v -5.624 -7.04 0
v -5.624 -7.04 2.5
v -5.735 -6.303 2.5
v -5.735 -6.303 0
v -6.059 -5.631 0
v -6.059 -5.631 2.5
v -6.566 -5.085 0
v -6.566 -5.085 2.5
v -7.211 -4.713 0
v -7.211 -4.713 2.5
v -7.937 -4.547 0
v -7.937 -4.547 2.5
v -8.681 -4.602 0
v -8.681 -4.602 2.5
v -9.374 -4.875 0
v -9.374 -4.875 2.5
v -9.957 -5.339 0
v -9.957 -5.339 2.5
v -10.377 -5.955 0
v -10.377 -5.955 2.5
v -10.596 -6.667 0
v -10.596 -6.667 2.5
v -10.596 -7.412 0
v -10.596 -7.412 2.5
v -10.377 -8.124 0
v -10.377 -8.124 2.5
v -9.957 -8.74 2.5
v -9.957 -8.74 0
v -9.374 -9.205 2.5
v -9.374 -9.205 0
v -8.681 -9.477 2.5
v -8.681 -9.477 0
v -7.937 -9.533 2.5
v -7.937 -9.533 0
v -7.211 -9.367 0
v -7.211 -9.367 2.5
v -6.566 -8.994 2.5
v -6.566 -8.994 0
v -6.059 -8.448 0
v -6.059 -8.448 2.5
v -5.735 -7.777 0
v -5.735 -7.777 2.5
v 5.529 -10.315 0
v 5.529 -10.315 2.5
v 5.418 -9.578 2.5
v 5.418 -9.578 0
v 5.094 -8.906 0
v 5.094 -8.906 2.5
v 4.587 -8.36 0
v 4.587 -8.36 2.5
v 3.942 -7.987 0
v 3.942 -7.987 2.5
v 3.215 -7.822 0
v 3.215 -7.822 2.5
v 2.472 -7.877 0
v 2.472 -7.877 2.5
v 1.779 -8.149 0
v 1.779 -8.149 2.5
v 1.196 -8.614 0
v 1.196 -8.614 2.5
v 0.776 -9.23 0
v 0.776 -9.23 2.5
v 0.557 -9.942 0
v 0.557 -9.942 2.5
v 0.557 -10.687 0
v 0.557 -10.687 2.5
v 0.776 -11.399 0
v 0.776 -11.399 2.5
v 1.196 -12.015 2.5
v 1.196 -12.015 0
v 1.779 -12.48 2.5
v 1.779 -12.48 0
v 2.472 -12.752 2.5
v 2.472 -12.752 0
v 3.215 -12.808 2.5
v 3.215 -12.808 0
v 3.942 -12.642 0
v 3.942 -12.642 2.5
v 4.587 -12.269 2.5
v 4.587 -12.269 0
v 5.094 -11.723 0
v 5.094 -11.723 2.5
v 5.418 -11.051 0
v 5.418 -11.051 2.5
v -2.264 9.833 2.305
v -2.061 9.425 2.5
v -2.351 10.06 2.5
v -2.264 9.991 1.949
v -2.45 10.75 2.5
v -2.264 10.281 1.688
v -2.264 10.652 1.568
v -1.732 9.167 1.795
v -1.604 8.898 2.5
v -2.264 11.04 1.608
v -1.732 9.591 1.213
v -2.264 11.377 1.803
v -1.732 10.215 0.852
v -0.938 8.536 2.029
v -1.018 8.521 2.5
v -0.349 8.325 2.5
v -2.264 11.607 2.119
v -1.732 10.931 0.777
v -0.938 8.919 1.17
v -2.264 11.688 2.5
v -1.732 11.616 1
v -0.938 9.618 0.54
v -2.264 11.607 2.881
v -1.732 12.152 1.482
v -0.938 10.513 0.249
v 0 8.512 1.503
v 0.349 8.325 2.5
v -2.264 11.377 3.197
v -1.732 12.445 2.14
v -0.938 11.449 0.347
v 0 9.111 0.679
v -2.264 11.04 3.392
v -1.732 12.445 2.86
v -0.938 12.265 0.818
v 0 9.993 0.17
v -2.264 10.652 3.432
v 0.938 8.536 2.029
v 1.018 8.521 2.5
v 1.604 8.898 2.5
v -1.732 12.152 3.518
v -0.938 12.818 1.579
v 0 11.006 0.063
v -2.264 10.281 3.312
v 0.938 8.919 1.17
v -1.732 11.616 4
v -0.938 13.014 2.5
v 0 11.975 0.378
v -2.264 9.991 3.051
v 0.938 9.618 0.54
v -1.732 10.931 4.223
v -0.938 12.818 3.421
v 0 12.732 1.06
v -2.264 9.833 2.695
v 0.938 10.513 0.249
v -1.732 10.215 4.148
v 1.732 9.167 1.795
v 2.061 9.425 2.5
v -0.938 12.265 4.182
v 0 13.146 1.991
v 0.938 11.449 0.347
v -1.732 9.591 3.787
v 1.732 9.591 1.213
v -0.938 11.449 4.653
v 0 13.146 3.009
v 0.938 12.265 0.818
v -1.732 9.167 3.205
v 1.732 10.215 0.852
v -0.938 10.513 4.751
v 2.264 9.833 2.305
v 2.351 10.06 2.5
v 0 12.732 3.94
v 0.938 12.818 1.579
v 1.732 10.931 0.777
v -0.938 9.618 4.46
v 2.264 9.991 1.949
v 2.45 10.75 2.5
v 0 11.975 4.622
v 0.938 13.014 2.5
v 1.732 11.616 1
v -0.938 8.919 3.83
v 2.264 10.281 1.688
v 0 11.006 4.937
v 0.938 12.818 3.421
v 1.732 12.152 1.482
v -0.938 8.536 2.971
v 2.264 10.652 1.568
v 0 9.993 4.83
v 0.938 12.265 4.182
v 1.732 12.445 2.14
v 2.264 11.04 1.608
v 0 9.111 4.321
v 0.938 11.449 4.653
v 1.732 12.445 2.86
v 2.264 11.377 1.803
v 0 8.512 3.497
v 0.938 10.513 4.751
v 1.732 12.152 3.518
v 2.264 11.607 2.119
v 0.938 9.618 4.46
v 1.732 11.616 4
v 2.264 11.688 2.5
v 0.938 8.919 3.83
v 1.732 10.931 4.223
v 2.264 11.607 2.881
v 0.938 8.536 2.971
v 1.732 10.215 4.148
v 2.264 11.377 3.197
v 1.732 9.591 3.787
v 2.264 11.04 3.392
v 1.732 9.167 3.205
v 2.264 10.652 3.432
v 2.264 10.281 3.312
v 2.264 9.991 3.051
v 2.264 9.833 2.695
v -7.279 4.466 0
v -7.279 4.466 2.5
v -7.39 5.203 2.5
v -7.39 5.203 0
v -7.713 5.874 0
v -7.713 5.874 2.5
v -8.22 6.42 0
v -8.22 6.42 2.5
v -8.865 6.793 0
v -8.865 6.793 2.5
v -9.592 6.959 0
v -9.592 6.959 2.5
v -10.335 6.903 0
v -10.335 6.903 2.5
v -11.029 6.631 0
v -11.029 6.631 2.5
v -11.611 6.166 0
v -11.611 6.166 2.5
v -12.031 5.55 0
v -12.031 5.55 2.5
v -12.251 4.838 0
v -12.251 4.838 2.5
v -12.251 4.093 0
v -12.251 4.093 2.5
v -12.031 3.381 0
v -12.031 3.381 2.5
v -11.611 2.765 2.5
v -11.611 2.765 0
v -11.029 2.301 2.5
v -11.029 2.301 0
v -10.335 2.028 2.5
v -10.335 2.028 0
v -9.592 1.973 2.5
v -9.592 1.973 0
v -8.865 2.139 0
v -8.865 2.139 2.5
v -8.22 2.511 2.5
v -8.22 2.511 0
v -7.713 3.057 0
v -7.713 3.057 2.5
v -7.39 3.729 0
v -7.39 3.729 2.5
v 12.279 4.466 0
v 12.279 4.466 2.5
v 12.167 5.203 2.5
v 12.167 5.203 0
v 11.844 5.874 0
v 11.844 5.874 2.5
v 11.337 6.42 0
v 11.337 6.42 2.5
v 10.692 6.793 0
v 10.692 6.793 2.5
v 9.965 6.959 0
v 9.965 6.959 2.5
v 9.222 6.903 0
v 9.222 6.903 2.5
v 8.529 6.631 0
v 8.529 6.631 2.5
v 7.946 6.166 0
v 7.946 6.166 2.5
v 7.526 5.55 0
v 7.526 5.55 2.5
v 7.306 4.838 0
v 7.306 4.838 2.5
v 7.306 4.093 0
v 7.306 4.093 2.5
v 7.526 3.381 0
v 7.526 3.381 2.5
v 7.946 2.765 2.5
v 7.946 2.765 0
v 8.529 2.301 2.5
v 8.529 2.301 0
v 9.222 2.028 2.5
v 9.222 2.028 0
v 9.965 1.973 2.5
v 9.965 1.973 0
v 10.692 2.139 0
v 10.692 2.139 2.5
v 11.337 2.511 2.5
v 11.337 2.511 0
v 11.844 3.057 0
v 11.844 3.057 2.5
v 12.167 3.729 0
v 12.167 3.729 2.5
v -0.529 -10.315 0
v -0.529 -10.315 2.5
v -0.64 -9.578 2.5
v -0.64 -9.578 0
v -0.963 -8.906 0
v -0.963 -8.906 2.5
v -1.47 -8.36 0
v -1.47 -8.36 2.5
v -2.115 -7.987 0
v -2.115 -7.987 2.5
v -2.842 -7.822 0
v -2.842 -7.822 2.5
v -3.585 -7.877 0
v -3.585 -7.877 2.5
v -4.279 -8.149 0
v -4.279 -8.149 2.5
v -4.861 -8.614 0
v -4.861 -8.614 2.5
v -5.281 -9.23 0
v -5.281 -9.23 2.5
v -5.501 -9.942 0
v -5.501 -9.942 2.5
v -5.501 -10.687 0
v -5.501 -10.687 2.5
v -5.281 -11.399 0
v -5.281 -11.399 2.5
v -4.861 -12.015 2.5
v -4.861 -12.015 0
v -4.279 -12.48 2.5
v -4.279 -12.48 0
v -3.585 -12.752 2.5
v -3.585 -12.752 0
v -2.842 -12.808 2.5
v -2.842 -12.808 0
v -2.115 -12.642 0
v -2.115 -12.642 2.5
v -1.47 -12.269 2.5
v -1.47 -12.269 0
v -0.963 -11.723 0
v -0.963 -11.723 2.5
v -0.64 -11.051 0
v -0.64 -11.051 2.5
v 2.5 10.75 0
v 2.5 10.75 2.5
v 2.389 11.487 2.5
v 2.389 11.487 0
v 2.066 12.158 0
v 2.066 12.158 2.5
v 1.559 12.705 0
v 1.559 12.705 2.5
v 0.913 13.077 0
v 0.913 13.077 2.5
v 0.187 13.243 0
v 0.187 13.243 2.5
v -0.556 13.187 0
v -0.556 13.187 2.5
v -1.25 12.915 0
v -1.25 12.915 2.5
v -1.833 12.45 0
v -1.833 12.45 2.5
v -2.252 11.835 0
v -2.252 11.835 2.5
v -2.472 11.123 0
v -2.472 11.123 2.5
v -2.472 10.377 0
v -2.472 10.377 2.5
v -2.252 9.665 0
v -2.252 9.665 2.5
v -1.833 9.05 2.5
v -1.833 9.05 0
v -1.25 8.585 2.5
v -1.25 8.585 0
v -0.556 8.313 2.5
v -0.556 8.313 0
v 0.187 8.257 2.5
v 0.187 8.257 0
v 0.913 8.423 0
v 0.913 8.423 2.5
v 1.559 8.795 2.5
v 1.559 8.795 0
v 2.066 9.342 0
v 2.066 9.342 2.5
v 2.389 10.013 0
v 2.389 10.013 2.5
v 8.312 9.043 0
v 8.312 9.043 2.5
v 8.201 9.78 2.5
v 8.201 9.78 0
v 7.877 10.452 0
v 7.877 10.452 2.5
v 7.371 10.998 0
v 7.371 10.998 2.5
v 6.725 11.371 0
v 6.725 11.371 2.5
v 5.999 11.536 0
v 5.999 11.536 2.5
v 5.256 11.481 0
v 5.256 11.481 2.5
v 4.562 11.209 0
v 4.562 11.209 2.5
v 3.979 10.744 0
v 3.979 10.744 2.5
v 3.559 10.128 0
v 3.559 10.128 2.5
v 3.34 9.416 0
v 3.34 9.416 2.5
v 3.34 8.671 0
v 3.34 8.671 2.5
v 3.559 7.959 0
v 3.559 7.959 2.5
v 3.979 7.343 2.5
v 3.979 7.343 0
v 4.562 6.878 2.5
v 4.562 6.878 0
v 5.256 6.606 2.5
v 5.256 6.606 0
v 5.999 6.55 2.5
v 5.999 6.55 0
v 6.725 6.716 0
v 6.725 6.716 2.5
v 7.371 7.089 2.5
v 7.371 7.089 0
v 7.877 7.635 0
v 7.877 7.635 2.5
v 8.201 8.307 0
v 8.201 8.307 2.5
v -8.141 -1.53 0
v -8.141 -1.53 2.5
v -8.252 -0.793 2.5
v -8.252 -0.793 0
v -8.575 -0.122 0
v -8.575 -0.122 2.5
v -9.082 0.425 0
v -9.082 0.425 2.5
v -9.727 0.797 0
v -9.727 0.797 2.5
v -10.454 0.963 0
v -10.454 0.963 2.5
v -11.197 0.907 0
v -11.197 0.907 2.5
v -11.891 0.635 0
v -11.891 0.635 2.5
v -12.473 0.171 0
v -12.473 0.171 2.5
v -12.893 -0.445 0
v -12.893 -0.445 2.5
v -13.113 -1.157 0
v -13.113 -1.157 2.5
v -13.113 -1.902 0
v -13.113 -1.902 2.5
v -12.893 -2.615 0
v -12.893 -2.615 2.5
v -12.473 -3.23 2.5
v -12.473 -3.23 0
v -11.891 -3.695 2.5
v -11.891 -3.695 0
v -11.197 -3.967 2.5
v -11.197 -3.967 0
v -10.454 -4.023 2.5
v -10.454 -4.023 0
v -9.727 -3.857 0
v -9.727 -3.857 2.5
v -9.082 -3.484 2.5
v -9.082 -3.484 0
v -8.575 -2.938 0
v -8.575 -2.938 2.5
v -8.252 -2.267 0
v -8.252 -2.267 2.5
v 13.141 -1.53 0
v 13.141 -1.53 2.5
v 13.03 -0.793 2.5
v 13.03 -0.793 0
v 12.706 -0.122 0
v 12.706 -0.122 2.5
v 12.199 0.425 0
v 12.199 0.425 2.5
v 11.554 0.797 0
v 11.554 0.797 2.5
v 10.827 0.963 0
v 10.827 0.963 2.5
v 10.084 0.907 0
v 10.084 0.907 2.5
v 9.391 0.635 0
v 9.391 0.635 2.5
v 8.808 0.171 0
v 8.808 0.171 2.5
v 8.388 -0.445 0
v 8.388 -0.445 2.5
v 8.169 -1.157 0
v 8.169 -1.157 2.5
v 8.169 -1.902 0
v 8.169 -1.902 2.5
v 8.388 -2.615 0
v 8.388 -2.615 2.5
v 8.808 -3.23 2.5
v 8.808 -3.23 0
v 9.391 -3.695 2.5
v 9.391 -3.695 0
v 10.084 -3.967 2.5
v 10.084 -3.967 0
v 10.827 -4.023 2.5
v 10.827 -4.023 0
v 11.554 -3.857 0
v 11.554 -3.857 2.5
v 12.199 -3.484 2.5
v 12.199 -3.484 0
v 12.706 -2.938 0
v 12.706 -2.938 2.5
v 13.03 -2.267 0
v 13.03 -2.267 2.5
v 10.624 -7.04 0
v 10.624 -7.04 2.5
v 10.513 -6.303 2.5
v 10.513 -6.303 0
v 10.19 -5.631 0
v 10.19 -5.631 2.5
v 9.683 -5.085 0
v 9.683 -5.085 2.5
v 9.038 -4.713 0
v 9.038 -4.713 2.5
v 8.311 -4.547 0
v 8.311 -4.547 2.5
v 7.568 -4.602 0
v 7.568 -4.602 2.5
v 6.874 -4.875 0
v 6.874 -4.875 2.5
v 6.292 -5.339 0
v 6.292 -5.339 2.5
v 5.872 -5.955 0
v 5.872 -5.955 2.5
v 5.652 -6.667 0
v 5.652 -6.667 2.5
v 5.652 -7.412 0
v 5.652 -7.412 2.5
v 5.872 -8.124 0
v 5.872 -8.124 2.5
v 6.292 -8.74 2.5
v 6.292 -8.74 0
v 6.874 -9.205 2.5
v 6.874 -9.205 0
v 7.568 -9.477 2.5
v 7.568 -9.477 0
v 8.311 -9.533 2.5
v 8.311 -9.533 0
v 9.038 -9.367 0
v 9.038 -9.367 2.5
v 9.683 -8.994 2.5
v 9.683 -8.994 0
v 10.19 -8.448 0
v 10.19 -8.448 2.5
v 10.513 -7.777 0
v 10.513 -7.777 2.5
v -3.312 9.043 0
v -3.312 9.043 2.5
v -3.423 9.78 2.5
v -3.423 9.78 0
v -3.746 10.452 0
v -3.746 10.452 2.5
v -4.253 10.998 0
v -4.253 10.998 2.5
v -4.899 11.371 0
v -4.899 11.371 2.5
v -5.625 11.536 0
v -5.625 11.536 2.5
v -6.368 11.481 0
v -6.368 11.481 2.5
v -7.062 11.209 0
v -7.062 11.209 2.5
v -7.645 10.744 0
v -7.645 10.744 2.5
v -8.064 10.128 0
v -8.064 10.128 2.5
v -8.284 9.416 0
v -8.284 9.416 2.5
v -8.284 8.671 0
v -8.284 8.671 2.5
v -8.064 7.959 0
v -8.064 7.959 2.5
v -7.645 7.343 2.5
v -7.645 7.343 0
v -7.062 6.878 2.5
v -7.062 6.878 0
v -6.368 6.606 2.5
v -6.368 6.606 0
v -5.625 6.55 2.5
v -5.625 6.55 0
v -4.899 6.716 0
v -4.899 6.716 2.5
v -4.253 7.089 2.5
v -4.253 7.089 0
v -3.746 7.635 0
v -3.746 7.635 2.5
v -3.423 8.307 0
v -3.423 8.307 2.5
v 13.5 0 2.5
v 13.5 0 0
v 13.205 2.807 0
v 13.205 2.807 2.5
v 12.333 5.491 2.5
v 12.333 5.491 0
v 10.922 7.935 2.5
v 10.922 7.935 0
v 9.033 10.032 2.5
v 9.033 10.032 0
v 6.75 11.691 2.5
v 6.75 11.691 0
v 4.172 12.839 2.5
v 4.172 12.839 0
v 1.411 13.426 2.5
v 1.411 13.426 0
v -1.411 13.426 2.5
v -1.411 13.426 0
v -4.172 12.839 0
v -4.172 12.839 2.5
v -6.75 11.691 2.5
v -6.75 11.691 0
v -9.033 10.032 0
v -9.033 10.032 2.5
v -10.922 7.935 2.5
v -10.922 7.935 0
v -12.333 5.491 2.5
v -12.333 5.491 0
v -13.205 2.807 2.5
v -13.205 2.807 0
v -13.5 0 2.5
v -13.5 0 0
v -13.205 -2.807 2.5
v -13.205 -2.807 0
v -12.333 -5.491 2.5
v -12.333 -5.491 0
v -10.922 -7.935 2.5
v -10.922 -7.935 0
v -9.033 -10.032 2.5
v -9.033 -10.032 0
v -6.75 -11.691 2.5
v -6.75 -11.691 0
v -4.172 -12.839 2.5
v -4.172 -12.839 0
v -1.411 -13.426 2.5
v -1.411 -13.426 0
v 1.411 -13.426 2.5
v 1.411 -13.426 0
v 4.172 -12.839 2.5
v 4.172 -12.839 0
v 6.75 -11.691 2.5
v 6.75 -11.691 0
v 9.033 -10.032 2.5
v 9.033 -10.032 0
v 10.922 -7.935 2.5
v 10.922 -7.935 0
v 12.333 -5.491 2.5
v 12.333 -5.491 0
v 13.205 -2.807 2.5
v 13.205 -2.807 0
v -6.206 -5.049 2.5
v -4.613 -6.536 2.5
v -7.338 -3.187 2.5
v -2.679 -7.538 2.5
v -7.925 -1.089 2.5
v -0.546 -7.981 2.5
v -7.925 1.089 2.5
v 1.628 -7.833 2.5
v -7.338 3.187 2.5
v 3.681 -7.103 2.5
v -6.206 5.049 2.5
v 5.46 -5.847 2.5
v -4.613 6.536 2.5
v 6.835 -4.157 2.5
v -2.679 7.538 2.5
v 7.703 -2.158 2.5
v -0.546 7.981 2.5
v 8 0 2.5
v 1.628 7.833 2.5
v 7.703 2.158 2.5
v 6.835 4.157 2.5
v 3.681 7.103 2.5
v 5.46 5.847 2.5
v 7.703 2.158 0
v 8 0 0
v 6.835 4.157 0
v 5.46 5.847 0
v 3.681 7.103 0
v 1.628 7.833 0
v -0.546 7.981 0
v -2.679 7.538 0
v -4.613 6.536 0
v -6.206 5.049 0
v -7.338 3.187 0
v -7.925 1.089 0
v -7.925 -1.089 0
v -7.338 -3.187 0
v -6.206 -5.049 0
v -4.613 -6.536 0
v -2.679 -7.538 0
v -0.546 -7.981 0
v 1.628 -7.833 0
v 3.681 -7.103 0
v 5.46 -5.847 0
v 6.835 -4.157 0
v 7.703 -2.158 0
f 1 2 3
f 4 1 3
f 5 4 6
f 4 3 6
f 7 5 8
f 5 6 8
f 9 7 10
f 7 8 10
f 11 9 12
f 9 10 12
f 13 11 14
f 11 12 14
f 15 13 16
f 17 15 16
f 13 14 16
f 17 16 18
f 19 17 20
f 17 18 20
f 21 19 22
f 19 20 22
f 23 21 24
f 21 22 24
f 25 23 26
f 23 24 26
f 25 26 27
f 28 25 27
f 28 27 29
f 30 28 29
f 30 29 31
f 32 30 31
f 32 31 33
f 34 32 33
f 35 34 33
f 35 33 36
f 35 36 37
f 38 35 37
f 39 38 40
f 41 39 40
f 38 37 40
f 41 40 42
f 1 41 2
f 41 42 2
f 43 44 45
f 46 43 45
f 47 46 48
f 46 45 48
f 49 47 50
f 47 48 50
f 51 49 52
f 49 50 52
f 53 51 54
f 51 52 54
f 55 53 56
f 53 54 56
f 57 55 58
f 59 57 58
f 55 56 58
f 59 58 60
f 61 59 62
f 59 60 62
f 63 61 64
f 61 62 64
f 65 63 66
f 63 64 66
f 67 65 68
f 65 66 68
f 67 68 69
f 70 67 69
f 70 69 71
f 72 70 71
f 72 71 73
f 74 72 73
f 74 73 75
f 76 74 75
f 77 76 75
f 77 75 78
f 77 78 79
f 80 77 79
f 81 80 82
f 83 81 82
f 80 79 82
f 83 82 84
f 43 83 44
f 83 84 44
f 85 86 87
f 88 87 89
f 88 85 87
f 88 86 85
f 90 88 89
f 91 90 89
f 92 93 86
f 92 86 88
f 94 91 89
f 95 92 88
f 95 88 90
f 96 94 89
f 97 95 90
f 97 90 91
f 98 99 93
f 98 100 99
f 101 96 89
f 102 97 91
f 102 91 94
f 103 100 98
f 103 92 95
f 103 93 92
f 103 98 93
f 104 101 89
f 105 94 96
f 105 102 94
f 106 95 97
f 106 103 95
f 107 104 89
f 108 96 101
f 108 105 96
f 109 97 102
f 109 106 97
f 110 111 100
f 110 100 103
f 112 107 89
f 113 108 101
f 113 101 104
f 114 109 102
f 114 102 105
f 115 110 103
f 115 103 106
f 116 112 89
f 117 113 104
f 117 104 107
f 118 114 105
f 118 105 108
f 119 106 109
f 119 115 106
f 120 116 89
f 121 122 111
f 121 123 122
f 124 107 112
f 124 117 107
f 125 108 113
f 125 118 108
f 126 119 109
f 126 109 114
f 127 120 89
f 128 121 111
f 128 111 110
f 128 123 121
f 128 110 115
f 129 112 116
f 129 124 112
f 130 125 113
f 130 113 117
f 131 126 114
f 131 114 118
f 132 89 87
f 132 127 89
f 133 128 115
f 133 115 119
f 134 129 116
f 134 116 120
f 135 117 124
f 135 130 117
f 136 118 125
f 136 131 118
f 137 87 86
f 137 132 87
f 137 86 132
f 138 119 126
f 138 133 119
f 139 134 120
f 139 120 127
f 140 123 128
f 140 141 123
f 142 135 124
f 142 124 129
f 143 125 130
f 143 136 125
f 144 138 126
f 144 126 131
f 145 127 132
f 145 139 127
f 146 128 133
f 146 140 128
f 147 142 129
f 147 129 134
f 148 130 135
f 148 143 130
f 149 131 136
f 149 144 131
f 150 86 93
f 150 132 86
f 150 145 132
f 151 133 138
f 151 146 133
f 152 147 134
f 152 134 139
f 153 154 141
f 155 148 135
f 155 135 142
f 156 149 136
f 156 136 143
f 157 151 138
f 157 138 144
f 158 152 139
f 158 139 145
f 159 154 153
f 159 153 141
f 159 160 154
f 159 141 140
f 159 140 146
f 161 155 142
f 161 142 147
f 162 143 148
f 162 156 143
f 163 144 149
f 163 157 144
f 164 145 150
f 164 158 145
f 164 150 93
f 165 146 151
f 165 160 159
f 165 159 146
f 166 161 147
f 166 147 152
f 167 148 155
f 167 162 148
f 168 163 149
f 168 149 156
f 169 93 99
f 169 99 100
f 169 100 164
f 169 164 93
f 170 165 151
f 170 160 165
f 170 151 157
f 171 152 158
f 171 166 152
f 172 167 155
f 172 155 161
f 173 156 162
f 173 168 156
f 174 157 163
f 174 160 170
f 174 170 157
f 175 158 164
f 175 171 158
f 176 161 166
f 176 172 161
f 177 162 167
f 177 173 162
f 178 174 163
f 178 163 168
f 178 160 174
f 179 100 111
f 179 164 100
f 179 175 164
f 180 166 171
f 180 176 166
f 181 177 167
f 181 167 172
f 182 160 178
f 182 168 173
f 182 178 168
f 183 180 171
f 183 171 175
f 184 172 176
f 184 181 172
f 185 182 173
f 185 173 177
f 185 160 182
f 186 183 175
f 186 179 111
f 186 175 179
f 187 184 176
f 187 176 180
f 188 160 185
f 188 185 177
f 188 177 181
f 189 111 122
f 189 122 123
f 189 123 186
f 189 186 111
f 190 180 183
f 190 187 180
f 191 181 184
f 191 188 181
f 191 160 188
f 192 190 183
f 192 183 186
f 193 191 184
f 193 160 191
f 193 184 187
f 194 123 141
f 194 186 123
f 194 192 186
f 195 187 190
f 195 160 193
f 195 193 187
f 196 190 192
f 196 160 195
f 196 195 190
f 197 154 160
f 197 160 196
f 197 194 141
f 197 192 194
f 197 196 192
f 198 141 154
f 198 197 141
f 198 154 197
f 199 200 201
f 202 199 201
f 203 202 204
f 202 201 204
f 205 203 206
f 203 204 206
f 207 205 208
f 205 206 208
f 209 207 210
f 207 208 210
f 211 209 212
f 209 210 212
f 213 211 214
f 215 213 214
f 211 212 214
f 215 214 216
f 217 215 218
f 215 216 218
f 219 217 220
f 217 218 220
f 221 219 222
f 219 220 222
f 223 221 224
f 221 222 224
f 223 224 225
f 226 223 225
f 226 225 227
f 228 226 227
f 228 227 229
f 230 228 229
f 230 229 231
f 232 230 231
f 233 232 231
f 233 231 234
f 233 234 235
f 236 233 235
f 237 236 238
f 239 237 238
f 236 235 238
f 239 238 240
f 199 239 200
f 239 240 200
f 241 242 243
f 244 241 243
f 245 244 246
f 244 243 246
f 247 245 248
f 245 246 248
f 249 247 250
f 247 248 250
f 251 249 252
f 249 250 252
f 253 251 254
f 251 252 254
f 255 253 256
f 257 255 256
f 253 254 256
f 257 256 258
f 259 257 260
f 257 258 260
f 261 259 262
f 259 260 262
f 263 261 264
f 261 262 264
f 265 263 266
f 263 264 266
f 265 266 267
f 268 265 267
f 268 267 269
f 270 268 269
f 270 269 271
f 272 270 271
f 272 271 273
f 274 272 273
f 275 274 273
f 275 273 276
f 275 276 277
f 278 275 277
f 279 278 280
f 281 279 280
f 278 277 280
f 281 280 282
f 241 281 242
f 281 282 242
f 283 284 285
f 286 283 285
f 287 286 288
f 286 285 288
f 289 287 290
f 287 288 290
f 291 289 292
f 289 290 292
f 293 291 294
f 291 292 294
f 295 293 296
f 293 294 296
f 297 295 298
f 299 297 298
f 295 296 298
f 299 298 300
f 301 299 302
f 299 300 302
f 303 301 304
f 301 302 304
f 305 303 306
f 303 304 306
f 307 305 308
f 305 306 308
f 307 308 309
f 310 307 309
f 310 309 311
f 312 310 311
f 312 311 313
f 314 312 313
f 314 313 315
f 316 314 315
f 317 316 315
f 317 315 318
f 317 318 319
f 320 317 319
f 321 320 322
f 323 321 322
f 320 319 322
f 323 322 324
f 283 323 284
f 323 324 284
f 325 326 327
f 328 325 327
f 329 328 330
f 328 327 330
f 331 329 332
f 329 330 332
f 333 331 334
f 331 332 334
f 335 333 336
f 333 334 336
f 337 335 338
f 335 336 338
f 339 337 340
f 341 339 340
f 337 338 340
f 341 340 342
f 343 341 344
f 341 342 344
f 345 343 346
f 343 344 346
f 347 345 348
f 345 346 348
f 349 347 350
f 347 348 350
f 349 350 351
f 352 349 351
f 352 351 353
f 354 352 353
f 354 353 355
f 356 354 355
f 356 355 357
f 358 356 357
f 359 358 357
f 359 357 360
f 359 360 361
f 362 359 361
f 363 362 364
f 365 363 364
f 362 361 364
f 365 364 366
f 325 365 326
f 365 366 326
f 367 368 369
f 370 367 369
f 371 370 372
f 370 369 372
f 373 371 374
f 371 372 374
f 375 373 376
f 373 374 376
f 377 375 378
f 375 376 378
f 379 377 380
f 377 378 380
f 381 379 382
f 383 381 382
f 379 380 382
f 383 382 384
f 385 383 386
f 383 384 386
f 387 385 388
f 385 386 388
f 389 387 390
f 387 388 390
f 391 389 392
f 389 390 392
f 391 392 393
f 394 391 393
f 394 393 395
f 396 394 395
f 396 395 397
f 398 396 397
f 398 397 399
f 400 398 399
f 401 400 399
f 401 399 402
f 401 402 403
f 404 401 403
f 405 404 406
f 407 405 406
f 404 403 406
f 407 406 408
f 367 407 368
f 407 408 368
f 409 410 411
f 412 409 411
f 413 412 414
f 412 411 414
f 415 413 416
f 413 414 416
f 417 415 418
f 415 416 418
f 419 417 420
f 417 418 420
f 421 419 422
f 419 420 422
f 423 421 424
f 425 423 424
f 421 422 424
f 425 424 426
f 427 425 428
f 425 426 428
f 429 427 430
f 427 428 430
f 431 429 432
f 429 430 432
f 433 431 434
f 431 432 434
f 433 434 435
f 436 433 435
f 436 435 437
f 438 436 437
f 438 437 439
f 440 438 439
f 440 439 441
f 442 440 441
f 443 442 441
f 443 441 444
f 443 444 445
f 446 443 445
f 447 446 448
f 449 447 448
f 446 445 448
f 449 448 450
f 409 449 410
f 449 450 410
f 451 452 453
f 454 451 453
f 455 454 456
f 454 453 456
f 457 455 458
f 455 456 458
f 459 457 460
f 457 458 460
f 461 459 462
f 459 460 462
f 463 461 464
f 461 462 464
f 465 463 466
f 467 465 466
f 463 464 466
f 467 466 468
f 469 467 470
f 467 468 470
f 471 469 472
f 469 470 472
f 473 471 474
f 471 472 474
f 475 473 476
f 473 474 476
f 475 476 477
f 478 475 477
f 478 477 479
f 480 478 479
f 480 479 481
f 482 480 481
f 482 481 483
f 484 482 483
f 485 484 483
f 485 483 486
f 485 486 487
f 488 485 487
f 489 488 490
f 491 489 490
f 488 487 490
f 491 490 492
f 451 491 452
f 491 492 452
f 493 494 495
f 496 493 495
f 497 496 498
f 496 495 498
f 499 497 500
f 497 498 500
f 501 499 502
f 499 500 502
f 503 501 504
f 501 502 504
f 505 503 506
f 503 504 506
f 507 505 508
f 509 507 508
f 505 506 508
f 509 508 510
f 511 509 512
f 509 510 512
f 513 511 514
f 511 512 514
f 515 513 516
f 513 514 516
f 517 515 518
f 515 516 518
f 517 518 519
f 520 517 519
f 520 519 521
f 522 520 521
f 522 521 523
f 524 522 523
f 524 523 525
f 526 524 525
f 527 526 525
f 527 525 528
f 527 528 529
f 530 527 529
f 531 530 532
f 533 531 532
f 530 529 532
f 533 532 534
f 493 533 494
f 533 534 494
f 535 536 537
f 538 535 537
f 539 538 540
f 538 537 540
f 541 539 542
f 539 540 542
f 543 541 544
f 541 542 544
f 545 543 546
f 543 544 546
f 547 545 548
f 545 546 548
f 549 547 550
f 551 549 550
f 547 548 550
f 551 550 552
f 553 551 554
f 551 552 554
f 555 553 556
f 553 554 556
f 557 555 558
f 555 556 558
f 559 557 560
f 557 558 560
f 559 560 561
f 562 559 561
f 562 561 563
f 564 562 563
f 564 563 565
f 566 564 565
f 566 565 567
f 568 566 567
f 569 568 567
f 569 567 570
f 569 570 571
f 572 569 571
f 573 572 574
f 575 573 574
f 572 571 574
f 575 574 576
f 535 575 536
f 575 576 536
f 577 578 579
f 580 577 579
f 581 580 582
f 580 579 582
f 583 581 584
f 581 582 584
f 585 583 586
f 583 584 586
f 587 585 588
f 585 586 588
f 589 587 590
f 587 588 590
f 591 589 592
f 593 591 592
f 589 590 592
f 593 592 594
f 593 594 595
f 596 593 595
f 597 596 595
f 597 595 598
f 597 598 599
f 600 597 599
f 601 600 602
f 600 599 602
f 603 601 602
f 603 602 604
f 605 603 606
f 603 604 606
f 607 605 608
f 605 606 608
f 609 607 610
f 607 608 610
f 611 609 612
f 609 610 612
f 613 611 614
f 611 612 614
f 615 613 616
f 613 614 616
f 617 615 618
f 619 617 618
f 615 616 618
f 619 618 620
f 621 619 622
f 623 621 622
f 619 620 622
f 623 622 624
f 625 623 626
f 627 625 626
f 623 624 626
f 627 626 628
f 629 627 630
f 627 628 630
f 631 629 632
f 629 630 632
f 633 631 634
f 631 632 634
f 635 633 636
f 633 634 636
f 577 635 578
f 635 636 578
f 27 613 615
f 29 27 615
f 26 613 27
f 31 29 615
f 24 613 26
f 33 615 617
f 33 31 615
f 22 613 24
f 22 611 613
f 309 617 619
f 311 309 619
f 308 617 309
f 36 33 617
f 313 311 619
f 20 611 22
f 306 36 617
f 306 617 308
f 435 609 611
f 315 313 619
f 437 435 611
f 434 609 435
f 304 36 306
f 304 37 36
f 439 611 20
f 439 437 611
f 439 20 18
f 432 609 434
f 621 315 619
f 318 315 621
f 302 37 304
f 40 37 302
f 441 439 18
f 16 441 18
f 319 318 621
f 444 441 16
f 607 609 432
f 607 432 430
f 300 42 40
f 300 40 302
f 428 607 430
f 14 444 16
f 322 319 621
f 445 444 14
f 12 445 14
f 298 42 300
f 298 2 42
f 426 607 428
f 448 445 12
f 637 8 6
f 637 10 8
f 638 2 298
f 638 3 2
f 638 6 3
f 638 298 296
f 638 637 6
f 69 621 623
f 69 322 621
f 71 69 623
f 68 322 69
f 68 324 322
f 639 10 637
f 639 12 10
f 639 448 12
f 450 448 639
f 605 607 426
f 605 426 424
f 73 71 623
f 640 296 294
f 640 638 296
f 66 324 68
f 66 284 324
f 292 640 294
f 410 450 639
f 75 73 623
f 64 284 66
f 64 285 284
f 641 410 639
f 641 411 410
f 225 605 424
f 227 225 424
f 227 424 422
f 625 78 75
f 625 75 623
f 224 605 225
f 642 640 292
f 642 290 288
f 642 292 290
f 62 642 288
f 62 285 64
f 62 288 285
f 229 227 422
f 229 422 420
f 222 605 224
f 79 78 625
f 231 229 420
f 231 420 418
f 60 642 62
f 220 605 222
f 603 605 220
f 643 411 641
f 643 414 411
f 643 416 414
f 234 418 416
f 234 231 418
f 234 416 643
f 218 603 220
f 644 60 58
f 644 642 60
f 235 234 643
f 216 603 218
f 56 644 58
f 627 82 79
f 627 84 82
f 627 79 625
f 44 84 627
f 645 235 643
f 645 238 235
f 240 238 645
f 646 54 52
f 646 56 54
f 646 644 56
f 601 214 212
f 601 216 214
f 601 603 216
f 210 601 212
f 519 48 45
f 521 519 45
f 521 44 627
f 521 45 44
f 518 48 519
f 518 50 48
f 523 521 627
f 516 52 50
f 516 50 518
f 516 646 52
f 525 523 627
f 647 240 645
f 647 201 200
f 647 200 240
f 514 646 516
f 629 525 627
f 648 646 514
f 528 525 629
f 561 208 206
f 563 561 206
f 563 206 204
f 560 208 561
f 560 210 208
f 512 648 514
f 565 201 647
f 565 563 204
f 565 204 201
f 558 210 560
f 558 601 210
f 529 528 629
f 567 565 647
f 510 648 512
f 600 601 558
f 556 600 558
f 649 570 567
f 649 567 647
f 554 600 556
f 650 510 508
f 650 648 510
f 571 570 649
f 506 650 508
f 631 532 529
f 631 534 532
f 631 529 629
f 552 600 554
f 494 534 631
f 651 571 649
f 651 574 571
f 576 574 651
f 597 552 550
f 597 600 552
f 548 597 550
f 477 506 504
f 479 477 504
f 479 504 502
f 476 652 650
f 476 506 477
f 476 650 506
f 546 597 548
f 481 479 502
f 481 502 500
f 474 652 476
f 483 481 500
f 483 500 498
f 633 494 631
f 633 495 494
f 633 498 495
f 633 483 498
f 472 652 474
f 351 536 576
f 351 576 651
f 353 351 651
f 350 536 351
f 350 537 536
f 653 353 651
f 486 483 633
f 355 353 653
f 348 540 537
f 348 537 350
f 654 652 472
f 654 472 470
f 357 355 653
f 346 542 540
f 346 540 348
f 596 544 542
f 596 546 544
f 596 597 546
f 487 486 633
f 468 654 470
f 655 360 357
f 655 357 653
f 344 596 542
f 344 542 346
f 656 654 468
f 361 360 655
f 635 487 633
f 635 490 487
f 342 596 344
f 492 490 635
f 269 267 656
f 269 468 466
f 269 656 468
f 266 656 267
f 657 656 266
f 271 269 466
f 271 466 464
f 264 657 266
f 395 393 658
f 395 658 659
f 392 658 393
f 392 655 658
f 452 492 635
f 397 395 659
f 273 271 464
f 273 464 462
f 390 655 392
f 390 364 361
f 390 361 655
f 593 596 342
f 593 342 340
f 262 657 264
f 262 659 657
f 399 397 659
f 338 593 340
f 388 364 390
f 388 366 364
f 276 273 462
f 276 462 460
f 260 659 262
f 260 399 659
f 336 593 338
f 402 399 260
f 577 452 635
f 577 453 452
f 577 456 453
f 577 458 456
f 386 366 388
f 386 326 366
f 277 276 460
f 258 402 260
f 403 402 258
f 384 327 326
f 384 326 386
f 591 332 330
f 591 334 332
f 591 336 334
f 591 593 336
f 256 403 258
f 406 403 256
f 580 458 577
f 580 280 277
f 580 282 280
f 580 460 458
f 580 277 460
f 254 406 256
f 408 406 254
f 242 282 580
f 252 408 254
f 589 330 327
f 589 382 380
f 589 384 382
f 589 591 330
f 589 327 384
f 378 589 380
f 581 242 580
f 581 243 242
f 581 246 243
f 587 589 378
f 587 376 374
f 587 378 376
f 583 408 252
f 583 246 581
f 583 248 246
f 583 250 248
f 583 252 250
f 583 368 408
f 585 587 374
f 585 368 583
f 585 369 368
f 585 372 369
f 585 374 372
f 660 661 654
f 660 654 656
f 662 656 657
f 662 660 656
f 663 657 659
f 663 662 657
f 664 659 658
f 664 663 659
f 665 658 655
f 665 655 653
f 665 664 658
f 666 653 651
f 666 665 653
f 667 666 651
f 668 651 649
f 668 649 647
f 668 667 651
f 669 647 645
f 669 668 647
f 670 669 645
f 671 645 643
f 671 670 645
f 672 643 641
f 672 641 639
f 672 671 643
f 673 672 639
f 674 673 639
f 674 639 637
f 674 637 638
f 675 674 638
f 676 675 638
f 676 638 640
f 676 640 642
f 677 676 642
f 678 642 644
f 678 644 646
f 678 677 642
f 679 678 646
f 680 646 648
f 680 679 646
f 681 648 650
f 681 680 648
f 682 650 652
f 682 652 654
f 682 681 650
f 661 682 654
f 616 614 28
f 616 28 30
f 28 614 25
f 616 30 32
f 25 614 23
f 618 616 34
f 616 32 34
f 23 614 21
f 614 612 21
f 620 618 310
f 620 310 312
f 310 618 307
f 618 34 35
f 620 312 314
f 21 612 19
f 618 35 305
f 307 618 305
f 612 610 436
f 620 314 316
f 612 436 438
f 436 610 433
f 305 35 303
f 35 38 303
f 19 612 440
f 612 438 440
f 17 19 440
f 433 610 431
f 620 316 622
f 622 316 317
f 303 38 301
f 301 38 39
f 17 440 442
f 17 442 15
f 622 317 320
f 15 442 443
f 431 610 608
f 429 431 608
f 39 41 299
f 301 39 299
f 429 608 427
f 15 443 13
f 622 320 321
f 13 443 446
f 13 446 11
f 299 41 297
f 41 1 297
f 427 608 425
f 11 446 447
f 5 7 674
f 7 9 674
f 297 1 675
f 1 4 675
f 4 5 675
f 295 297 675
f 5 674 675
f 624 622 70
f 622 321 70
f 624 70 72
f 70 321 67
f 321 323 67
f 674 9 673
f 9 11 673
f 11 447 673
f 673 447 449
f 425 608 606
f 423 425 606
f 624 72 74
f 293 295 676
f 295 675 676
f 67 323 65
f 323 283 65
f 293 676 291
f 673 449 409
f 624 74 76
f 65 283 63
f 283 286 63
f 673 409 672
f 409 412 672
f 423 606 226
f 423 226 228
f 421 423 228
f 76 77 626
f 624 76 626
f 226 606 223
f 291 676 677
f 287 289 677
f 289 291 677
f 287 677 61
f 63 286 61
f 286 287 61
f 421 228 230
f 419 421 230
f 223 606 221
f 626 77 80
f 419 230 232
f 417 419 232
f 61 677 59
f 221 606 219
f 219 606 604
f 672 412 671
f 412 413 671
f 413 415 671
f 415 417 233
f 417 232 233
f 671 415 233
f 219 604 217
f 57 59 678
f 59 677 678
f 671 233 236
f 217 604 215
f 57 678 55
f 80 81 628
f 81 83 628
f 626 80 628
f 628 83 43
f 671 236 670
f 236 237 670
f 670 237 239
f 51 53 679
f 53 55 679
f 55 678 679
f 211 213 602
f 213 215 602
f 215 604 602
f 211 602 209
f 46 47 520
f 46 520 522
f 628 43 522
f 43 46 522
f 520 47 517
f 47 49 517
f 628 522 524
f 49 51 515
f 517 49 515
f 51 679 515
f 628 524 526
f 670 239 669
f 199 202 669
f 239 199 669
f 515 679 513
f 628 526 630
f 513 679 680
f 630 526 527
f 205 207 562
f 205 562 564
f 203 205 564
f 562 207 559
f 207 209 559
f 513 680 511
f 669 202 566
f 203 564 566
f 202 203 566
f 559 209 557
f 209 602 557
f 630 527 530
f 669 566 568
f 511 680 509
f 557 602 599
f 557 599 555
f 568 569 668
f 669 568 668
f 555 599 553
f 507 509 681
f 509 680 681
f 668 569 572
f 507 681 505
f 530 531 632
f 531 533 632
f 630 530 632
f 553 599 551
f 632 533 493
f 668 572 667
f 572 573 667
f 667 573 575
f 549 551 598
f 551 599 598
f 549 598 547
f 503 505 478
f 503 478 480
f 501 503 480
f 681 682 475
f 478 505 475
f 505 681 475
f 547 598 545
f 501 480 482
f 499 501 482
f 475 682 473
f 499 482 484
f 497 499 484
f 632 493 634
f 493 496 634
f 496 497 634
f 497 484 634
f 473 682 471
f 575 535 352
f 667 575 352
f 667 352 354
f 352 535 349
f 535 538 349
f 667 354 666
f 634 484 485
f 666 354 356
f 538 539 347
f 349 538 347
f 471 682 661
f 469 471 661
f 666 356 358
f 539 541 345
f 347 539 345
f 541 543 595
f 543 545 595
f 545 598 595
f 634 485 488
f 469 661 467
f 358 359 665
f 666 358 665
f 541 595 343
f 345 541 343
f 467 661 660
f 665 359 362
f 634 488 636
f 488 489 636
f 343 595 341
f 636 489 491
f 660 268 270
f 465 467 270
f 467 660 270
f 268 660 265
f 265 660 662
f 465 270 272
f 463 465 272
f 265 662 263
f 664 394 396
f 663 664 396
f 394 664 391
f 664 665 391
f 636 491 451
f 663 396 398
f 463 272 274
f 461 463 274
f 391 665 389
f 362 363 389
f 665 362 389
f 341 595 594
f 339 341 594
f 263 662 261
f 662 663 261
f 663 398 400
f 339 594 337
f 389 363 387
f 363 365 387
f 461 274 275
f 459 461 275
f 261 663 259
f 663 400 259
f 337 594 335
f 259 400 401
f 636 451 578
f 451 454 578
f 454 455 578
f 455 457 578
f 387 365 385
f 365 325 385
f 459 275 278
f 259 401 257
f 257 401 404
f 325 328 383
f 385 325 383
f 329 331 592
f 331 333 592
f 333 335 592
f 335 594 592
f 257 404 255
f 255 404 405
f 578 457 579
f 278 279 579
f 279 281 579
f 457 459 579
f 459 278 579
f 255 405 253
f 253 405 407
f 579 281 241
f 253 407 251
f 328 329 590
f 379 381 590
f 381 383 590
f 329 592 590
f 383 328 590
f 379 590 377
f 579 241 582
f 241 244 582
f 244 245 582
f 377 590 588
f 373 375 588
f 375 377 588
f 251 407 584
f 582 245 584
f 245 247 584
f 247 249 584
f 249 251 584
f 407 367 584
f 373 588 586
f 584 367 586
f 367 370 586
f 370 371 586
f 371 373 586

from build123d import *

# Parameters (mm, degrees)
F0_R     = 13.5
F0_R_2   = 8
F1_DEPTH = 2.5
F2_R     = 2.5
F3_DEPTH = 2.5


with BuildPart() as f1:
    # F0 (on Top) → F1 (new body)
    with BuildSketch(Plane.XY):
        Circle(F0_R)
        Circle(F0_R_2, mode=Mode.SUBTRACT)
    extrude(amount=F1_DEPTH)

    # F2 (on face) → F3 (cut)
    with BuildSketch(Plane.XY.offset(2.5)):
        with Locations((0, 10.75)):
            Circle(F2_R)
        with Locations((5.811889, 9.043475)):
            Circle(F2_R)
        with Locations((9.778544, 4.465711)):
            Circle(F2_R)
        with Locations((10.640581, -1.529885)):
            Circle(F2_R)
        with Locations((8.124308, -7.039753)):
            Circle(F2_R)
        with Locations((3.028625, -10.314549)):
            Circle(F2_R)
        with Locations((-3.028625, -10.314549)):
            Circle(F2_R)
        with Locations((-8.124308, -7.039753)):
            Circle(F2_R)
        with Locations((-10.64058, -1.529885)):
            Circle(F2_R)
        with Locations((-9.778544, 4.465711)):
            Circle(F2_R)
        with Locations((-5.811889, 9.043475)):
            Circle(F2_R)
    extrude(amount=-F3_DEPTH, mode=Mode.SUBTRACT)


with BuildPart() as f5:
    # F4 (on face) → F5 (revolve)
    with BuildSketch(Plane.XY.offset(2.5)):
        with BuildLine():
            Line((2.45, 10.75), (0, 10.75))
            Line((0, 10.75), (-2.45, 10.75))
            ThreePointArc((-2.45, 10.75), (0, 8.3), (2.45, 10.75))
        make_face()
    revolve(axis=Axis((1.225, 10.75, 2.5), (1, 0, 0)))


solid = Compound([f1.part, f5.part])
